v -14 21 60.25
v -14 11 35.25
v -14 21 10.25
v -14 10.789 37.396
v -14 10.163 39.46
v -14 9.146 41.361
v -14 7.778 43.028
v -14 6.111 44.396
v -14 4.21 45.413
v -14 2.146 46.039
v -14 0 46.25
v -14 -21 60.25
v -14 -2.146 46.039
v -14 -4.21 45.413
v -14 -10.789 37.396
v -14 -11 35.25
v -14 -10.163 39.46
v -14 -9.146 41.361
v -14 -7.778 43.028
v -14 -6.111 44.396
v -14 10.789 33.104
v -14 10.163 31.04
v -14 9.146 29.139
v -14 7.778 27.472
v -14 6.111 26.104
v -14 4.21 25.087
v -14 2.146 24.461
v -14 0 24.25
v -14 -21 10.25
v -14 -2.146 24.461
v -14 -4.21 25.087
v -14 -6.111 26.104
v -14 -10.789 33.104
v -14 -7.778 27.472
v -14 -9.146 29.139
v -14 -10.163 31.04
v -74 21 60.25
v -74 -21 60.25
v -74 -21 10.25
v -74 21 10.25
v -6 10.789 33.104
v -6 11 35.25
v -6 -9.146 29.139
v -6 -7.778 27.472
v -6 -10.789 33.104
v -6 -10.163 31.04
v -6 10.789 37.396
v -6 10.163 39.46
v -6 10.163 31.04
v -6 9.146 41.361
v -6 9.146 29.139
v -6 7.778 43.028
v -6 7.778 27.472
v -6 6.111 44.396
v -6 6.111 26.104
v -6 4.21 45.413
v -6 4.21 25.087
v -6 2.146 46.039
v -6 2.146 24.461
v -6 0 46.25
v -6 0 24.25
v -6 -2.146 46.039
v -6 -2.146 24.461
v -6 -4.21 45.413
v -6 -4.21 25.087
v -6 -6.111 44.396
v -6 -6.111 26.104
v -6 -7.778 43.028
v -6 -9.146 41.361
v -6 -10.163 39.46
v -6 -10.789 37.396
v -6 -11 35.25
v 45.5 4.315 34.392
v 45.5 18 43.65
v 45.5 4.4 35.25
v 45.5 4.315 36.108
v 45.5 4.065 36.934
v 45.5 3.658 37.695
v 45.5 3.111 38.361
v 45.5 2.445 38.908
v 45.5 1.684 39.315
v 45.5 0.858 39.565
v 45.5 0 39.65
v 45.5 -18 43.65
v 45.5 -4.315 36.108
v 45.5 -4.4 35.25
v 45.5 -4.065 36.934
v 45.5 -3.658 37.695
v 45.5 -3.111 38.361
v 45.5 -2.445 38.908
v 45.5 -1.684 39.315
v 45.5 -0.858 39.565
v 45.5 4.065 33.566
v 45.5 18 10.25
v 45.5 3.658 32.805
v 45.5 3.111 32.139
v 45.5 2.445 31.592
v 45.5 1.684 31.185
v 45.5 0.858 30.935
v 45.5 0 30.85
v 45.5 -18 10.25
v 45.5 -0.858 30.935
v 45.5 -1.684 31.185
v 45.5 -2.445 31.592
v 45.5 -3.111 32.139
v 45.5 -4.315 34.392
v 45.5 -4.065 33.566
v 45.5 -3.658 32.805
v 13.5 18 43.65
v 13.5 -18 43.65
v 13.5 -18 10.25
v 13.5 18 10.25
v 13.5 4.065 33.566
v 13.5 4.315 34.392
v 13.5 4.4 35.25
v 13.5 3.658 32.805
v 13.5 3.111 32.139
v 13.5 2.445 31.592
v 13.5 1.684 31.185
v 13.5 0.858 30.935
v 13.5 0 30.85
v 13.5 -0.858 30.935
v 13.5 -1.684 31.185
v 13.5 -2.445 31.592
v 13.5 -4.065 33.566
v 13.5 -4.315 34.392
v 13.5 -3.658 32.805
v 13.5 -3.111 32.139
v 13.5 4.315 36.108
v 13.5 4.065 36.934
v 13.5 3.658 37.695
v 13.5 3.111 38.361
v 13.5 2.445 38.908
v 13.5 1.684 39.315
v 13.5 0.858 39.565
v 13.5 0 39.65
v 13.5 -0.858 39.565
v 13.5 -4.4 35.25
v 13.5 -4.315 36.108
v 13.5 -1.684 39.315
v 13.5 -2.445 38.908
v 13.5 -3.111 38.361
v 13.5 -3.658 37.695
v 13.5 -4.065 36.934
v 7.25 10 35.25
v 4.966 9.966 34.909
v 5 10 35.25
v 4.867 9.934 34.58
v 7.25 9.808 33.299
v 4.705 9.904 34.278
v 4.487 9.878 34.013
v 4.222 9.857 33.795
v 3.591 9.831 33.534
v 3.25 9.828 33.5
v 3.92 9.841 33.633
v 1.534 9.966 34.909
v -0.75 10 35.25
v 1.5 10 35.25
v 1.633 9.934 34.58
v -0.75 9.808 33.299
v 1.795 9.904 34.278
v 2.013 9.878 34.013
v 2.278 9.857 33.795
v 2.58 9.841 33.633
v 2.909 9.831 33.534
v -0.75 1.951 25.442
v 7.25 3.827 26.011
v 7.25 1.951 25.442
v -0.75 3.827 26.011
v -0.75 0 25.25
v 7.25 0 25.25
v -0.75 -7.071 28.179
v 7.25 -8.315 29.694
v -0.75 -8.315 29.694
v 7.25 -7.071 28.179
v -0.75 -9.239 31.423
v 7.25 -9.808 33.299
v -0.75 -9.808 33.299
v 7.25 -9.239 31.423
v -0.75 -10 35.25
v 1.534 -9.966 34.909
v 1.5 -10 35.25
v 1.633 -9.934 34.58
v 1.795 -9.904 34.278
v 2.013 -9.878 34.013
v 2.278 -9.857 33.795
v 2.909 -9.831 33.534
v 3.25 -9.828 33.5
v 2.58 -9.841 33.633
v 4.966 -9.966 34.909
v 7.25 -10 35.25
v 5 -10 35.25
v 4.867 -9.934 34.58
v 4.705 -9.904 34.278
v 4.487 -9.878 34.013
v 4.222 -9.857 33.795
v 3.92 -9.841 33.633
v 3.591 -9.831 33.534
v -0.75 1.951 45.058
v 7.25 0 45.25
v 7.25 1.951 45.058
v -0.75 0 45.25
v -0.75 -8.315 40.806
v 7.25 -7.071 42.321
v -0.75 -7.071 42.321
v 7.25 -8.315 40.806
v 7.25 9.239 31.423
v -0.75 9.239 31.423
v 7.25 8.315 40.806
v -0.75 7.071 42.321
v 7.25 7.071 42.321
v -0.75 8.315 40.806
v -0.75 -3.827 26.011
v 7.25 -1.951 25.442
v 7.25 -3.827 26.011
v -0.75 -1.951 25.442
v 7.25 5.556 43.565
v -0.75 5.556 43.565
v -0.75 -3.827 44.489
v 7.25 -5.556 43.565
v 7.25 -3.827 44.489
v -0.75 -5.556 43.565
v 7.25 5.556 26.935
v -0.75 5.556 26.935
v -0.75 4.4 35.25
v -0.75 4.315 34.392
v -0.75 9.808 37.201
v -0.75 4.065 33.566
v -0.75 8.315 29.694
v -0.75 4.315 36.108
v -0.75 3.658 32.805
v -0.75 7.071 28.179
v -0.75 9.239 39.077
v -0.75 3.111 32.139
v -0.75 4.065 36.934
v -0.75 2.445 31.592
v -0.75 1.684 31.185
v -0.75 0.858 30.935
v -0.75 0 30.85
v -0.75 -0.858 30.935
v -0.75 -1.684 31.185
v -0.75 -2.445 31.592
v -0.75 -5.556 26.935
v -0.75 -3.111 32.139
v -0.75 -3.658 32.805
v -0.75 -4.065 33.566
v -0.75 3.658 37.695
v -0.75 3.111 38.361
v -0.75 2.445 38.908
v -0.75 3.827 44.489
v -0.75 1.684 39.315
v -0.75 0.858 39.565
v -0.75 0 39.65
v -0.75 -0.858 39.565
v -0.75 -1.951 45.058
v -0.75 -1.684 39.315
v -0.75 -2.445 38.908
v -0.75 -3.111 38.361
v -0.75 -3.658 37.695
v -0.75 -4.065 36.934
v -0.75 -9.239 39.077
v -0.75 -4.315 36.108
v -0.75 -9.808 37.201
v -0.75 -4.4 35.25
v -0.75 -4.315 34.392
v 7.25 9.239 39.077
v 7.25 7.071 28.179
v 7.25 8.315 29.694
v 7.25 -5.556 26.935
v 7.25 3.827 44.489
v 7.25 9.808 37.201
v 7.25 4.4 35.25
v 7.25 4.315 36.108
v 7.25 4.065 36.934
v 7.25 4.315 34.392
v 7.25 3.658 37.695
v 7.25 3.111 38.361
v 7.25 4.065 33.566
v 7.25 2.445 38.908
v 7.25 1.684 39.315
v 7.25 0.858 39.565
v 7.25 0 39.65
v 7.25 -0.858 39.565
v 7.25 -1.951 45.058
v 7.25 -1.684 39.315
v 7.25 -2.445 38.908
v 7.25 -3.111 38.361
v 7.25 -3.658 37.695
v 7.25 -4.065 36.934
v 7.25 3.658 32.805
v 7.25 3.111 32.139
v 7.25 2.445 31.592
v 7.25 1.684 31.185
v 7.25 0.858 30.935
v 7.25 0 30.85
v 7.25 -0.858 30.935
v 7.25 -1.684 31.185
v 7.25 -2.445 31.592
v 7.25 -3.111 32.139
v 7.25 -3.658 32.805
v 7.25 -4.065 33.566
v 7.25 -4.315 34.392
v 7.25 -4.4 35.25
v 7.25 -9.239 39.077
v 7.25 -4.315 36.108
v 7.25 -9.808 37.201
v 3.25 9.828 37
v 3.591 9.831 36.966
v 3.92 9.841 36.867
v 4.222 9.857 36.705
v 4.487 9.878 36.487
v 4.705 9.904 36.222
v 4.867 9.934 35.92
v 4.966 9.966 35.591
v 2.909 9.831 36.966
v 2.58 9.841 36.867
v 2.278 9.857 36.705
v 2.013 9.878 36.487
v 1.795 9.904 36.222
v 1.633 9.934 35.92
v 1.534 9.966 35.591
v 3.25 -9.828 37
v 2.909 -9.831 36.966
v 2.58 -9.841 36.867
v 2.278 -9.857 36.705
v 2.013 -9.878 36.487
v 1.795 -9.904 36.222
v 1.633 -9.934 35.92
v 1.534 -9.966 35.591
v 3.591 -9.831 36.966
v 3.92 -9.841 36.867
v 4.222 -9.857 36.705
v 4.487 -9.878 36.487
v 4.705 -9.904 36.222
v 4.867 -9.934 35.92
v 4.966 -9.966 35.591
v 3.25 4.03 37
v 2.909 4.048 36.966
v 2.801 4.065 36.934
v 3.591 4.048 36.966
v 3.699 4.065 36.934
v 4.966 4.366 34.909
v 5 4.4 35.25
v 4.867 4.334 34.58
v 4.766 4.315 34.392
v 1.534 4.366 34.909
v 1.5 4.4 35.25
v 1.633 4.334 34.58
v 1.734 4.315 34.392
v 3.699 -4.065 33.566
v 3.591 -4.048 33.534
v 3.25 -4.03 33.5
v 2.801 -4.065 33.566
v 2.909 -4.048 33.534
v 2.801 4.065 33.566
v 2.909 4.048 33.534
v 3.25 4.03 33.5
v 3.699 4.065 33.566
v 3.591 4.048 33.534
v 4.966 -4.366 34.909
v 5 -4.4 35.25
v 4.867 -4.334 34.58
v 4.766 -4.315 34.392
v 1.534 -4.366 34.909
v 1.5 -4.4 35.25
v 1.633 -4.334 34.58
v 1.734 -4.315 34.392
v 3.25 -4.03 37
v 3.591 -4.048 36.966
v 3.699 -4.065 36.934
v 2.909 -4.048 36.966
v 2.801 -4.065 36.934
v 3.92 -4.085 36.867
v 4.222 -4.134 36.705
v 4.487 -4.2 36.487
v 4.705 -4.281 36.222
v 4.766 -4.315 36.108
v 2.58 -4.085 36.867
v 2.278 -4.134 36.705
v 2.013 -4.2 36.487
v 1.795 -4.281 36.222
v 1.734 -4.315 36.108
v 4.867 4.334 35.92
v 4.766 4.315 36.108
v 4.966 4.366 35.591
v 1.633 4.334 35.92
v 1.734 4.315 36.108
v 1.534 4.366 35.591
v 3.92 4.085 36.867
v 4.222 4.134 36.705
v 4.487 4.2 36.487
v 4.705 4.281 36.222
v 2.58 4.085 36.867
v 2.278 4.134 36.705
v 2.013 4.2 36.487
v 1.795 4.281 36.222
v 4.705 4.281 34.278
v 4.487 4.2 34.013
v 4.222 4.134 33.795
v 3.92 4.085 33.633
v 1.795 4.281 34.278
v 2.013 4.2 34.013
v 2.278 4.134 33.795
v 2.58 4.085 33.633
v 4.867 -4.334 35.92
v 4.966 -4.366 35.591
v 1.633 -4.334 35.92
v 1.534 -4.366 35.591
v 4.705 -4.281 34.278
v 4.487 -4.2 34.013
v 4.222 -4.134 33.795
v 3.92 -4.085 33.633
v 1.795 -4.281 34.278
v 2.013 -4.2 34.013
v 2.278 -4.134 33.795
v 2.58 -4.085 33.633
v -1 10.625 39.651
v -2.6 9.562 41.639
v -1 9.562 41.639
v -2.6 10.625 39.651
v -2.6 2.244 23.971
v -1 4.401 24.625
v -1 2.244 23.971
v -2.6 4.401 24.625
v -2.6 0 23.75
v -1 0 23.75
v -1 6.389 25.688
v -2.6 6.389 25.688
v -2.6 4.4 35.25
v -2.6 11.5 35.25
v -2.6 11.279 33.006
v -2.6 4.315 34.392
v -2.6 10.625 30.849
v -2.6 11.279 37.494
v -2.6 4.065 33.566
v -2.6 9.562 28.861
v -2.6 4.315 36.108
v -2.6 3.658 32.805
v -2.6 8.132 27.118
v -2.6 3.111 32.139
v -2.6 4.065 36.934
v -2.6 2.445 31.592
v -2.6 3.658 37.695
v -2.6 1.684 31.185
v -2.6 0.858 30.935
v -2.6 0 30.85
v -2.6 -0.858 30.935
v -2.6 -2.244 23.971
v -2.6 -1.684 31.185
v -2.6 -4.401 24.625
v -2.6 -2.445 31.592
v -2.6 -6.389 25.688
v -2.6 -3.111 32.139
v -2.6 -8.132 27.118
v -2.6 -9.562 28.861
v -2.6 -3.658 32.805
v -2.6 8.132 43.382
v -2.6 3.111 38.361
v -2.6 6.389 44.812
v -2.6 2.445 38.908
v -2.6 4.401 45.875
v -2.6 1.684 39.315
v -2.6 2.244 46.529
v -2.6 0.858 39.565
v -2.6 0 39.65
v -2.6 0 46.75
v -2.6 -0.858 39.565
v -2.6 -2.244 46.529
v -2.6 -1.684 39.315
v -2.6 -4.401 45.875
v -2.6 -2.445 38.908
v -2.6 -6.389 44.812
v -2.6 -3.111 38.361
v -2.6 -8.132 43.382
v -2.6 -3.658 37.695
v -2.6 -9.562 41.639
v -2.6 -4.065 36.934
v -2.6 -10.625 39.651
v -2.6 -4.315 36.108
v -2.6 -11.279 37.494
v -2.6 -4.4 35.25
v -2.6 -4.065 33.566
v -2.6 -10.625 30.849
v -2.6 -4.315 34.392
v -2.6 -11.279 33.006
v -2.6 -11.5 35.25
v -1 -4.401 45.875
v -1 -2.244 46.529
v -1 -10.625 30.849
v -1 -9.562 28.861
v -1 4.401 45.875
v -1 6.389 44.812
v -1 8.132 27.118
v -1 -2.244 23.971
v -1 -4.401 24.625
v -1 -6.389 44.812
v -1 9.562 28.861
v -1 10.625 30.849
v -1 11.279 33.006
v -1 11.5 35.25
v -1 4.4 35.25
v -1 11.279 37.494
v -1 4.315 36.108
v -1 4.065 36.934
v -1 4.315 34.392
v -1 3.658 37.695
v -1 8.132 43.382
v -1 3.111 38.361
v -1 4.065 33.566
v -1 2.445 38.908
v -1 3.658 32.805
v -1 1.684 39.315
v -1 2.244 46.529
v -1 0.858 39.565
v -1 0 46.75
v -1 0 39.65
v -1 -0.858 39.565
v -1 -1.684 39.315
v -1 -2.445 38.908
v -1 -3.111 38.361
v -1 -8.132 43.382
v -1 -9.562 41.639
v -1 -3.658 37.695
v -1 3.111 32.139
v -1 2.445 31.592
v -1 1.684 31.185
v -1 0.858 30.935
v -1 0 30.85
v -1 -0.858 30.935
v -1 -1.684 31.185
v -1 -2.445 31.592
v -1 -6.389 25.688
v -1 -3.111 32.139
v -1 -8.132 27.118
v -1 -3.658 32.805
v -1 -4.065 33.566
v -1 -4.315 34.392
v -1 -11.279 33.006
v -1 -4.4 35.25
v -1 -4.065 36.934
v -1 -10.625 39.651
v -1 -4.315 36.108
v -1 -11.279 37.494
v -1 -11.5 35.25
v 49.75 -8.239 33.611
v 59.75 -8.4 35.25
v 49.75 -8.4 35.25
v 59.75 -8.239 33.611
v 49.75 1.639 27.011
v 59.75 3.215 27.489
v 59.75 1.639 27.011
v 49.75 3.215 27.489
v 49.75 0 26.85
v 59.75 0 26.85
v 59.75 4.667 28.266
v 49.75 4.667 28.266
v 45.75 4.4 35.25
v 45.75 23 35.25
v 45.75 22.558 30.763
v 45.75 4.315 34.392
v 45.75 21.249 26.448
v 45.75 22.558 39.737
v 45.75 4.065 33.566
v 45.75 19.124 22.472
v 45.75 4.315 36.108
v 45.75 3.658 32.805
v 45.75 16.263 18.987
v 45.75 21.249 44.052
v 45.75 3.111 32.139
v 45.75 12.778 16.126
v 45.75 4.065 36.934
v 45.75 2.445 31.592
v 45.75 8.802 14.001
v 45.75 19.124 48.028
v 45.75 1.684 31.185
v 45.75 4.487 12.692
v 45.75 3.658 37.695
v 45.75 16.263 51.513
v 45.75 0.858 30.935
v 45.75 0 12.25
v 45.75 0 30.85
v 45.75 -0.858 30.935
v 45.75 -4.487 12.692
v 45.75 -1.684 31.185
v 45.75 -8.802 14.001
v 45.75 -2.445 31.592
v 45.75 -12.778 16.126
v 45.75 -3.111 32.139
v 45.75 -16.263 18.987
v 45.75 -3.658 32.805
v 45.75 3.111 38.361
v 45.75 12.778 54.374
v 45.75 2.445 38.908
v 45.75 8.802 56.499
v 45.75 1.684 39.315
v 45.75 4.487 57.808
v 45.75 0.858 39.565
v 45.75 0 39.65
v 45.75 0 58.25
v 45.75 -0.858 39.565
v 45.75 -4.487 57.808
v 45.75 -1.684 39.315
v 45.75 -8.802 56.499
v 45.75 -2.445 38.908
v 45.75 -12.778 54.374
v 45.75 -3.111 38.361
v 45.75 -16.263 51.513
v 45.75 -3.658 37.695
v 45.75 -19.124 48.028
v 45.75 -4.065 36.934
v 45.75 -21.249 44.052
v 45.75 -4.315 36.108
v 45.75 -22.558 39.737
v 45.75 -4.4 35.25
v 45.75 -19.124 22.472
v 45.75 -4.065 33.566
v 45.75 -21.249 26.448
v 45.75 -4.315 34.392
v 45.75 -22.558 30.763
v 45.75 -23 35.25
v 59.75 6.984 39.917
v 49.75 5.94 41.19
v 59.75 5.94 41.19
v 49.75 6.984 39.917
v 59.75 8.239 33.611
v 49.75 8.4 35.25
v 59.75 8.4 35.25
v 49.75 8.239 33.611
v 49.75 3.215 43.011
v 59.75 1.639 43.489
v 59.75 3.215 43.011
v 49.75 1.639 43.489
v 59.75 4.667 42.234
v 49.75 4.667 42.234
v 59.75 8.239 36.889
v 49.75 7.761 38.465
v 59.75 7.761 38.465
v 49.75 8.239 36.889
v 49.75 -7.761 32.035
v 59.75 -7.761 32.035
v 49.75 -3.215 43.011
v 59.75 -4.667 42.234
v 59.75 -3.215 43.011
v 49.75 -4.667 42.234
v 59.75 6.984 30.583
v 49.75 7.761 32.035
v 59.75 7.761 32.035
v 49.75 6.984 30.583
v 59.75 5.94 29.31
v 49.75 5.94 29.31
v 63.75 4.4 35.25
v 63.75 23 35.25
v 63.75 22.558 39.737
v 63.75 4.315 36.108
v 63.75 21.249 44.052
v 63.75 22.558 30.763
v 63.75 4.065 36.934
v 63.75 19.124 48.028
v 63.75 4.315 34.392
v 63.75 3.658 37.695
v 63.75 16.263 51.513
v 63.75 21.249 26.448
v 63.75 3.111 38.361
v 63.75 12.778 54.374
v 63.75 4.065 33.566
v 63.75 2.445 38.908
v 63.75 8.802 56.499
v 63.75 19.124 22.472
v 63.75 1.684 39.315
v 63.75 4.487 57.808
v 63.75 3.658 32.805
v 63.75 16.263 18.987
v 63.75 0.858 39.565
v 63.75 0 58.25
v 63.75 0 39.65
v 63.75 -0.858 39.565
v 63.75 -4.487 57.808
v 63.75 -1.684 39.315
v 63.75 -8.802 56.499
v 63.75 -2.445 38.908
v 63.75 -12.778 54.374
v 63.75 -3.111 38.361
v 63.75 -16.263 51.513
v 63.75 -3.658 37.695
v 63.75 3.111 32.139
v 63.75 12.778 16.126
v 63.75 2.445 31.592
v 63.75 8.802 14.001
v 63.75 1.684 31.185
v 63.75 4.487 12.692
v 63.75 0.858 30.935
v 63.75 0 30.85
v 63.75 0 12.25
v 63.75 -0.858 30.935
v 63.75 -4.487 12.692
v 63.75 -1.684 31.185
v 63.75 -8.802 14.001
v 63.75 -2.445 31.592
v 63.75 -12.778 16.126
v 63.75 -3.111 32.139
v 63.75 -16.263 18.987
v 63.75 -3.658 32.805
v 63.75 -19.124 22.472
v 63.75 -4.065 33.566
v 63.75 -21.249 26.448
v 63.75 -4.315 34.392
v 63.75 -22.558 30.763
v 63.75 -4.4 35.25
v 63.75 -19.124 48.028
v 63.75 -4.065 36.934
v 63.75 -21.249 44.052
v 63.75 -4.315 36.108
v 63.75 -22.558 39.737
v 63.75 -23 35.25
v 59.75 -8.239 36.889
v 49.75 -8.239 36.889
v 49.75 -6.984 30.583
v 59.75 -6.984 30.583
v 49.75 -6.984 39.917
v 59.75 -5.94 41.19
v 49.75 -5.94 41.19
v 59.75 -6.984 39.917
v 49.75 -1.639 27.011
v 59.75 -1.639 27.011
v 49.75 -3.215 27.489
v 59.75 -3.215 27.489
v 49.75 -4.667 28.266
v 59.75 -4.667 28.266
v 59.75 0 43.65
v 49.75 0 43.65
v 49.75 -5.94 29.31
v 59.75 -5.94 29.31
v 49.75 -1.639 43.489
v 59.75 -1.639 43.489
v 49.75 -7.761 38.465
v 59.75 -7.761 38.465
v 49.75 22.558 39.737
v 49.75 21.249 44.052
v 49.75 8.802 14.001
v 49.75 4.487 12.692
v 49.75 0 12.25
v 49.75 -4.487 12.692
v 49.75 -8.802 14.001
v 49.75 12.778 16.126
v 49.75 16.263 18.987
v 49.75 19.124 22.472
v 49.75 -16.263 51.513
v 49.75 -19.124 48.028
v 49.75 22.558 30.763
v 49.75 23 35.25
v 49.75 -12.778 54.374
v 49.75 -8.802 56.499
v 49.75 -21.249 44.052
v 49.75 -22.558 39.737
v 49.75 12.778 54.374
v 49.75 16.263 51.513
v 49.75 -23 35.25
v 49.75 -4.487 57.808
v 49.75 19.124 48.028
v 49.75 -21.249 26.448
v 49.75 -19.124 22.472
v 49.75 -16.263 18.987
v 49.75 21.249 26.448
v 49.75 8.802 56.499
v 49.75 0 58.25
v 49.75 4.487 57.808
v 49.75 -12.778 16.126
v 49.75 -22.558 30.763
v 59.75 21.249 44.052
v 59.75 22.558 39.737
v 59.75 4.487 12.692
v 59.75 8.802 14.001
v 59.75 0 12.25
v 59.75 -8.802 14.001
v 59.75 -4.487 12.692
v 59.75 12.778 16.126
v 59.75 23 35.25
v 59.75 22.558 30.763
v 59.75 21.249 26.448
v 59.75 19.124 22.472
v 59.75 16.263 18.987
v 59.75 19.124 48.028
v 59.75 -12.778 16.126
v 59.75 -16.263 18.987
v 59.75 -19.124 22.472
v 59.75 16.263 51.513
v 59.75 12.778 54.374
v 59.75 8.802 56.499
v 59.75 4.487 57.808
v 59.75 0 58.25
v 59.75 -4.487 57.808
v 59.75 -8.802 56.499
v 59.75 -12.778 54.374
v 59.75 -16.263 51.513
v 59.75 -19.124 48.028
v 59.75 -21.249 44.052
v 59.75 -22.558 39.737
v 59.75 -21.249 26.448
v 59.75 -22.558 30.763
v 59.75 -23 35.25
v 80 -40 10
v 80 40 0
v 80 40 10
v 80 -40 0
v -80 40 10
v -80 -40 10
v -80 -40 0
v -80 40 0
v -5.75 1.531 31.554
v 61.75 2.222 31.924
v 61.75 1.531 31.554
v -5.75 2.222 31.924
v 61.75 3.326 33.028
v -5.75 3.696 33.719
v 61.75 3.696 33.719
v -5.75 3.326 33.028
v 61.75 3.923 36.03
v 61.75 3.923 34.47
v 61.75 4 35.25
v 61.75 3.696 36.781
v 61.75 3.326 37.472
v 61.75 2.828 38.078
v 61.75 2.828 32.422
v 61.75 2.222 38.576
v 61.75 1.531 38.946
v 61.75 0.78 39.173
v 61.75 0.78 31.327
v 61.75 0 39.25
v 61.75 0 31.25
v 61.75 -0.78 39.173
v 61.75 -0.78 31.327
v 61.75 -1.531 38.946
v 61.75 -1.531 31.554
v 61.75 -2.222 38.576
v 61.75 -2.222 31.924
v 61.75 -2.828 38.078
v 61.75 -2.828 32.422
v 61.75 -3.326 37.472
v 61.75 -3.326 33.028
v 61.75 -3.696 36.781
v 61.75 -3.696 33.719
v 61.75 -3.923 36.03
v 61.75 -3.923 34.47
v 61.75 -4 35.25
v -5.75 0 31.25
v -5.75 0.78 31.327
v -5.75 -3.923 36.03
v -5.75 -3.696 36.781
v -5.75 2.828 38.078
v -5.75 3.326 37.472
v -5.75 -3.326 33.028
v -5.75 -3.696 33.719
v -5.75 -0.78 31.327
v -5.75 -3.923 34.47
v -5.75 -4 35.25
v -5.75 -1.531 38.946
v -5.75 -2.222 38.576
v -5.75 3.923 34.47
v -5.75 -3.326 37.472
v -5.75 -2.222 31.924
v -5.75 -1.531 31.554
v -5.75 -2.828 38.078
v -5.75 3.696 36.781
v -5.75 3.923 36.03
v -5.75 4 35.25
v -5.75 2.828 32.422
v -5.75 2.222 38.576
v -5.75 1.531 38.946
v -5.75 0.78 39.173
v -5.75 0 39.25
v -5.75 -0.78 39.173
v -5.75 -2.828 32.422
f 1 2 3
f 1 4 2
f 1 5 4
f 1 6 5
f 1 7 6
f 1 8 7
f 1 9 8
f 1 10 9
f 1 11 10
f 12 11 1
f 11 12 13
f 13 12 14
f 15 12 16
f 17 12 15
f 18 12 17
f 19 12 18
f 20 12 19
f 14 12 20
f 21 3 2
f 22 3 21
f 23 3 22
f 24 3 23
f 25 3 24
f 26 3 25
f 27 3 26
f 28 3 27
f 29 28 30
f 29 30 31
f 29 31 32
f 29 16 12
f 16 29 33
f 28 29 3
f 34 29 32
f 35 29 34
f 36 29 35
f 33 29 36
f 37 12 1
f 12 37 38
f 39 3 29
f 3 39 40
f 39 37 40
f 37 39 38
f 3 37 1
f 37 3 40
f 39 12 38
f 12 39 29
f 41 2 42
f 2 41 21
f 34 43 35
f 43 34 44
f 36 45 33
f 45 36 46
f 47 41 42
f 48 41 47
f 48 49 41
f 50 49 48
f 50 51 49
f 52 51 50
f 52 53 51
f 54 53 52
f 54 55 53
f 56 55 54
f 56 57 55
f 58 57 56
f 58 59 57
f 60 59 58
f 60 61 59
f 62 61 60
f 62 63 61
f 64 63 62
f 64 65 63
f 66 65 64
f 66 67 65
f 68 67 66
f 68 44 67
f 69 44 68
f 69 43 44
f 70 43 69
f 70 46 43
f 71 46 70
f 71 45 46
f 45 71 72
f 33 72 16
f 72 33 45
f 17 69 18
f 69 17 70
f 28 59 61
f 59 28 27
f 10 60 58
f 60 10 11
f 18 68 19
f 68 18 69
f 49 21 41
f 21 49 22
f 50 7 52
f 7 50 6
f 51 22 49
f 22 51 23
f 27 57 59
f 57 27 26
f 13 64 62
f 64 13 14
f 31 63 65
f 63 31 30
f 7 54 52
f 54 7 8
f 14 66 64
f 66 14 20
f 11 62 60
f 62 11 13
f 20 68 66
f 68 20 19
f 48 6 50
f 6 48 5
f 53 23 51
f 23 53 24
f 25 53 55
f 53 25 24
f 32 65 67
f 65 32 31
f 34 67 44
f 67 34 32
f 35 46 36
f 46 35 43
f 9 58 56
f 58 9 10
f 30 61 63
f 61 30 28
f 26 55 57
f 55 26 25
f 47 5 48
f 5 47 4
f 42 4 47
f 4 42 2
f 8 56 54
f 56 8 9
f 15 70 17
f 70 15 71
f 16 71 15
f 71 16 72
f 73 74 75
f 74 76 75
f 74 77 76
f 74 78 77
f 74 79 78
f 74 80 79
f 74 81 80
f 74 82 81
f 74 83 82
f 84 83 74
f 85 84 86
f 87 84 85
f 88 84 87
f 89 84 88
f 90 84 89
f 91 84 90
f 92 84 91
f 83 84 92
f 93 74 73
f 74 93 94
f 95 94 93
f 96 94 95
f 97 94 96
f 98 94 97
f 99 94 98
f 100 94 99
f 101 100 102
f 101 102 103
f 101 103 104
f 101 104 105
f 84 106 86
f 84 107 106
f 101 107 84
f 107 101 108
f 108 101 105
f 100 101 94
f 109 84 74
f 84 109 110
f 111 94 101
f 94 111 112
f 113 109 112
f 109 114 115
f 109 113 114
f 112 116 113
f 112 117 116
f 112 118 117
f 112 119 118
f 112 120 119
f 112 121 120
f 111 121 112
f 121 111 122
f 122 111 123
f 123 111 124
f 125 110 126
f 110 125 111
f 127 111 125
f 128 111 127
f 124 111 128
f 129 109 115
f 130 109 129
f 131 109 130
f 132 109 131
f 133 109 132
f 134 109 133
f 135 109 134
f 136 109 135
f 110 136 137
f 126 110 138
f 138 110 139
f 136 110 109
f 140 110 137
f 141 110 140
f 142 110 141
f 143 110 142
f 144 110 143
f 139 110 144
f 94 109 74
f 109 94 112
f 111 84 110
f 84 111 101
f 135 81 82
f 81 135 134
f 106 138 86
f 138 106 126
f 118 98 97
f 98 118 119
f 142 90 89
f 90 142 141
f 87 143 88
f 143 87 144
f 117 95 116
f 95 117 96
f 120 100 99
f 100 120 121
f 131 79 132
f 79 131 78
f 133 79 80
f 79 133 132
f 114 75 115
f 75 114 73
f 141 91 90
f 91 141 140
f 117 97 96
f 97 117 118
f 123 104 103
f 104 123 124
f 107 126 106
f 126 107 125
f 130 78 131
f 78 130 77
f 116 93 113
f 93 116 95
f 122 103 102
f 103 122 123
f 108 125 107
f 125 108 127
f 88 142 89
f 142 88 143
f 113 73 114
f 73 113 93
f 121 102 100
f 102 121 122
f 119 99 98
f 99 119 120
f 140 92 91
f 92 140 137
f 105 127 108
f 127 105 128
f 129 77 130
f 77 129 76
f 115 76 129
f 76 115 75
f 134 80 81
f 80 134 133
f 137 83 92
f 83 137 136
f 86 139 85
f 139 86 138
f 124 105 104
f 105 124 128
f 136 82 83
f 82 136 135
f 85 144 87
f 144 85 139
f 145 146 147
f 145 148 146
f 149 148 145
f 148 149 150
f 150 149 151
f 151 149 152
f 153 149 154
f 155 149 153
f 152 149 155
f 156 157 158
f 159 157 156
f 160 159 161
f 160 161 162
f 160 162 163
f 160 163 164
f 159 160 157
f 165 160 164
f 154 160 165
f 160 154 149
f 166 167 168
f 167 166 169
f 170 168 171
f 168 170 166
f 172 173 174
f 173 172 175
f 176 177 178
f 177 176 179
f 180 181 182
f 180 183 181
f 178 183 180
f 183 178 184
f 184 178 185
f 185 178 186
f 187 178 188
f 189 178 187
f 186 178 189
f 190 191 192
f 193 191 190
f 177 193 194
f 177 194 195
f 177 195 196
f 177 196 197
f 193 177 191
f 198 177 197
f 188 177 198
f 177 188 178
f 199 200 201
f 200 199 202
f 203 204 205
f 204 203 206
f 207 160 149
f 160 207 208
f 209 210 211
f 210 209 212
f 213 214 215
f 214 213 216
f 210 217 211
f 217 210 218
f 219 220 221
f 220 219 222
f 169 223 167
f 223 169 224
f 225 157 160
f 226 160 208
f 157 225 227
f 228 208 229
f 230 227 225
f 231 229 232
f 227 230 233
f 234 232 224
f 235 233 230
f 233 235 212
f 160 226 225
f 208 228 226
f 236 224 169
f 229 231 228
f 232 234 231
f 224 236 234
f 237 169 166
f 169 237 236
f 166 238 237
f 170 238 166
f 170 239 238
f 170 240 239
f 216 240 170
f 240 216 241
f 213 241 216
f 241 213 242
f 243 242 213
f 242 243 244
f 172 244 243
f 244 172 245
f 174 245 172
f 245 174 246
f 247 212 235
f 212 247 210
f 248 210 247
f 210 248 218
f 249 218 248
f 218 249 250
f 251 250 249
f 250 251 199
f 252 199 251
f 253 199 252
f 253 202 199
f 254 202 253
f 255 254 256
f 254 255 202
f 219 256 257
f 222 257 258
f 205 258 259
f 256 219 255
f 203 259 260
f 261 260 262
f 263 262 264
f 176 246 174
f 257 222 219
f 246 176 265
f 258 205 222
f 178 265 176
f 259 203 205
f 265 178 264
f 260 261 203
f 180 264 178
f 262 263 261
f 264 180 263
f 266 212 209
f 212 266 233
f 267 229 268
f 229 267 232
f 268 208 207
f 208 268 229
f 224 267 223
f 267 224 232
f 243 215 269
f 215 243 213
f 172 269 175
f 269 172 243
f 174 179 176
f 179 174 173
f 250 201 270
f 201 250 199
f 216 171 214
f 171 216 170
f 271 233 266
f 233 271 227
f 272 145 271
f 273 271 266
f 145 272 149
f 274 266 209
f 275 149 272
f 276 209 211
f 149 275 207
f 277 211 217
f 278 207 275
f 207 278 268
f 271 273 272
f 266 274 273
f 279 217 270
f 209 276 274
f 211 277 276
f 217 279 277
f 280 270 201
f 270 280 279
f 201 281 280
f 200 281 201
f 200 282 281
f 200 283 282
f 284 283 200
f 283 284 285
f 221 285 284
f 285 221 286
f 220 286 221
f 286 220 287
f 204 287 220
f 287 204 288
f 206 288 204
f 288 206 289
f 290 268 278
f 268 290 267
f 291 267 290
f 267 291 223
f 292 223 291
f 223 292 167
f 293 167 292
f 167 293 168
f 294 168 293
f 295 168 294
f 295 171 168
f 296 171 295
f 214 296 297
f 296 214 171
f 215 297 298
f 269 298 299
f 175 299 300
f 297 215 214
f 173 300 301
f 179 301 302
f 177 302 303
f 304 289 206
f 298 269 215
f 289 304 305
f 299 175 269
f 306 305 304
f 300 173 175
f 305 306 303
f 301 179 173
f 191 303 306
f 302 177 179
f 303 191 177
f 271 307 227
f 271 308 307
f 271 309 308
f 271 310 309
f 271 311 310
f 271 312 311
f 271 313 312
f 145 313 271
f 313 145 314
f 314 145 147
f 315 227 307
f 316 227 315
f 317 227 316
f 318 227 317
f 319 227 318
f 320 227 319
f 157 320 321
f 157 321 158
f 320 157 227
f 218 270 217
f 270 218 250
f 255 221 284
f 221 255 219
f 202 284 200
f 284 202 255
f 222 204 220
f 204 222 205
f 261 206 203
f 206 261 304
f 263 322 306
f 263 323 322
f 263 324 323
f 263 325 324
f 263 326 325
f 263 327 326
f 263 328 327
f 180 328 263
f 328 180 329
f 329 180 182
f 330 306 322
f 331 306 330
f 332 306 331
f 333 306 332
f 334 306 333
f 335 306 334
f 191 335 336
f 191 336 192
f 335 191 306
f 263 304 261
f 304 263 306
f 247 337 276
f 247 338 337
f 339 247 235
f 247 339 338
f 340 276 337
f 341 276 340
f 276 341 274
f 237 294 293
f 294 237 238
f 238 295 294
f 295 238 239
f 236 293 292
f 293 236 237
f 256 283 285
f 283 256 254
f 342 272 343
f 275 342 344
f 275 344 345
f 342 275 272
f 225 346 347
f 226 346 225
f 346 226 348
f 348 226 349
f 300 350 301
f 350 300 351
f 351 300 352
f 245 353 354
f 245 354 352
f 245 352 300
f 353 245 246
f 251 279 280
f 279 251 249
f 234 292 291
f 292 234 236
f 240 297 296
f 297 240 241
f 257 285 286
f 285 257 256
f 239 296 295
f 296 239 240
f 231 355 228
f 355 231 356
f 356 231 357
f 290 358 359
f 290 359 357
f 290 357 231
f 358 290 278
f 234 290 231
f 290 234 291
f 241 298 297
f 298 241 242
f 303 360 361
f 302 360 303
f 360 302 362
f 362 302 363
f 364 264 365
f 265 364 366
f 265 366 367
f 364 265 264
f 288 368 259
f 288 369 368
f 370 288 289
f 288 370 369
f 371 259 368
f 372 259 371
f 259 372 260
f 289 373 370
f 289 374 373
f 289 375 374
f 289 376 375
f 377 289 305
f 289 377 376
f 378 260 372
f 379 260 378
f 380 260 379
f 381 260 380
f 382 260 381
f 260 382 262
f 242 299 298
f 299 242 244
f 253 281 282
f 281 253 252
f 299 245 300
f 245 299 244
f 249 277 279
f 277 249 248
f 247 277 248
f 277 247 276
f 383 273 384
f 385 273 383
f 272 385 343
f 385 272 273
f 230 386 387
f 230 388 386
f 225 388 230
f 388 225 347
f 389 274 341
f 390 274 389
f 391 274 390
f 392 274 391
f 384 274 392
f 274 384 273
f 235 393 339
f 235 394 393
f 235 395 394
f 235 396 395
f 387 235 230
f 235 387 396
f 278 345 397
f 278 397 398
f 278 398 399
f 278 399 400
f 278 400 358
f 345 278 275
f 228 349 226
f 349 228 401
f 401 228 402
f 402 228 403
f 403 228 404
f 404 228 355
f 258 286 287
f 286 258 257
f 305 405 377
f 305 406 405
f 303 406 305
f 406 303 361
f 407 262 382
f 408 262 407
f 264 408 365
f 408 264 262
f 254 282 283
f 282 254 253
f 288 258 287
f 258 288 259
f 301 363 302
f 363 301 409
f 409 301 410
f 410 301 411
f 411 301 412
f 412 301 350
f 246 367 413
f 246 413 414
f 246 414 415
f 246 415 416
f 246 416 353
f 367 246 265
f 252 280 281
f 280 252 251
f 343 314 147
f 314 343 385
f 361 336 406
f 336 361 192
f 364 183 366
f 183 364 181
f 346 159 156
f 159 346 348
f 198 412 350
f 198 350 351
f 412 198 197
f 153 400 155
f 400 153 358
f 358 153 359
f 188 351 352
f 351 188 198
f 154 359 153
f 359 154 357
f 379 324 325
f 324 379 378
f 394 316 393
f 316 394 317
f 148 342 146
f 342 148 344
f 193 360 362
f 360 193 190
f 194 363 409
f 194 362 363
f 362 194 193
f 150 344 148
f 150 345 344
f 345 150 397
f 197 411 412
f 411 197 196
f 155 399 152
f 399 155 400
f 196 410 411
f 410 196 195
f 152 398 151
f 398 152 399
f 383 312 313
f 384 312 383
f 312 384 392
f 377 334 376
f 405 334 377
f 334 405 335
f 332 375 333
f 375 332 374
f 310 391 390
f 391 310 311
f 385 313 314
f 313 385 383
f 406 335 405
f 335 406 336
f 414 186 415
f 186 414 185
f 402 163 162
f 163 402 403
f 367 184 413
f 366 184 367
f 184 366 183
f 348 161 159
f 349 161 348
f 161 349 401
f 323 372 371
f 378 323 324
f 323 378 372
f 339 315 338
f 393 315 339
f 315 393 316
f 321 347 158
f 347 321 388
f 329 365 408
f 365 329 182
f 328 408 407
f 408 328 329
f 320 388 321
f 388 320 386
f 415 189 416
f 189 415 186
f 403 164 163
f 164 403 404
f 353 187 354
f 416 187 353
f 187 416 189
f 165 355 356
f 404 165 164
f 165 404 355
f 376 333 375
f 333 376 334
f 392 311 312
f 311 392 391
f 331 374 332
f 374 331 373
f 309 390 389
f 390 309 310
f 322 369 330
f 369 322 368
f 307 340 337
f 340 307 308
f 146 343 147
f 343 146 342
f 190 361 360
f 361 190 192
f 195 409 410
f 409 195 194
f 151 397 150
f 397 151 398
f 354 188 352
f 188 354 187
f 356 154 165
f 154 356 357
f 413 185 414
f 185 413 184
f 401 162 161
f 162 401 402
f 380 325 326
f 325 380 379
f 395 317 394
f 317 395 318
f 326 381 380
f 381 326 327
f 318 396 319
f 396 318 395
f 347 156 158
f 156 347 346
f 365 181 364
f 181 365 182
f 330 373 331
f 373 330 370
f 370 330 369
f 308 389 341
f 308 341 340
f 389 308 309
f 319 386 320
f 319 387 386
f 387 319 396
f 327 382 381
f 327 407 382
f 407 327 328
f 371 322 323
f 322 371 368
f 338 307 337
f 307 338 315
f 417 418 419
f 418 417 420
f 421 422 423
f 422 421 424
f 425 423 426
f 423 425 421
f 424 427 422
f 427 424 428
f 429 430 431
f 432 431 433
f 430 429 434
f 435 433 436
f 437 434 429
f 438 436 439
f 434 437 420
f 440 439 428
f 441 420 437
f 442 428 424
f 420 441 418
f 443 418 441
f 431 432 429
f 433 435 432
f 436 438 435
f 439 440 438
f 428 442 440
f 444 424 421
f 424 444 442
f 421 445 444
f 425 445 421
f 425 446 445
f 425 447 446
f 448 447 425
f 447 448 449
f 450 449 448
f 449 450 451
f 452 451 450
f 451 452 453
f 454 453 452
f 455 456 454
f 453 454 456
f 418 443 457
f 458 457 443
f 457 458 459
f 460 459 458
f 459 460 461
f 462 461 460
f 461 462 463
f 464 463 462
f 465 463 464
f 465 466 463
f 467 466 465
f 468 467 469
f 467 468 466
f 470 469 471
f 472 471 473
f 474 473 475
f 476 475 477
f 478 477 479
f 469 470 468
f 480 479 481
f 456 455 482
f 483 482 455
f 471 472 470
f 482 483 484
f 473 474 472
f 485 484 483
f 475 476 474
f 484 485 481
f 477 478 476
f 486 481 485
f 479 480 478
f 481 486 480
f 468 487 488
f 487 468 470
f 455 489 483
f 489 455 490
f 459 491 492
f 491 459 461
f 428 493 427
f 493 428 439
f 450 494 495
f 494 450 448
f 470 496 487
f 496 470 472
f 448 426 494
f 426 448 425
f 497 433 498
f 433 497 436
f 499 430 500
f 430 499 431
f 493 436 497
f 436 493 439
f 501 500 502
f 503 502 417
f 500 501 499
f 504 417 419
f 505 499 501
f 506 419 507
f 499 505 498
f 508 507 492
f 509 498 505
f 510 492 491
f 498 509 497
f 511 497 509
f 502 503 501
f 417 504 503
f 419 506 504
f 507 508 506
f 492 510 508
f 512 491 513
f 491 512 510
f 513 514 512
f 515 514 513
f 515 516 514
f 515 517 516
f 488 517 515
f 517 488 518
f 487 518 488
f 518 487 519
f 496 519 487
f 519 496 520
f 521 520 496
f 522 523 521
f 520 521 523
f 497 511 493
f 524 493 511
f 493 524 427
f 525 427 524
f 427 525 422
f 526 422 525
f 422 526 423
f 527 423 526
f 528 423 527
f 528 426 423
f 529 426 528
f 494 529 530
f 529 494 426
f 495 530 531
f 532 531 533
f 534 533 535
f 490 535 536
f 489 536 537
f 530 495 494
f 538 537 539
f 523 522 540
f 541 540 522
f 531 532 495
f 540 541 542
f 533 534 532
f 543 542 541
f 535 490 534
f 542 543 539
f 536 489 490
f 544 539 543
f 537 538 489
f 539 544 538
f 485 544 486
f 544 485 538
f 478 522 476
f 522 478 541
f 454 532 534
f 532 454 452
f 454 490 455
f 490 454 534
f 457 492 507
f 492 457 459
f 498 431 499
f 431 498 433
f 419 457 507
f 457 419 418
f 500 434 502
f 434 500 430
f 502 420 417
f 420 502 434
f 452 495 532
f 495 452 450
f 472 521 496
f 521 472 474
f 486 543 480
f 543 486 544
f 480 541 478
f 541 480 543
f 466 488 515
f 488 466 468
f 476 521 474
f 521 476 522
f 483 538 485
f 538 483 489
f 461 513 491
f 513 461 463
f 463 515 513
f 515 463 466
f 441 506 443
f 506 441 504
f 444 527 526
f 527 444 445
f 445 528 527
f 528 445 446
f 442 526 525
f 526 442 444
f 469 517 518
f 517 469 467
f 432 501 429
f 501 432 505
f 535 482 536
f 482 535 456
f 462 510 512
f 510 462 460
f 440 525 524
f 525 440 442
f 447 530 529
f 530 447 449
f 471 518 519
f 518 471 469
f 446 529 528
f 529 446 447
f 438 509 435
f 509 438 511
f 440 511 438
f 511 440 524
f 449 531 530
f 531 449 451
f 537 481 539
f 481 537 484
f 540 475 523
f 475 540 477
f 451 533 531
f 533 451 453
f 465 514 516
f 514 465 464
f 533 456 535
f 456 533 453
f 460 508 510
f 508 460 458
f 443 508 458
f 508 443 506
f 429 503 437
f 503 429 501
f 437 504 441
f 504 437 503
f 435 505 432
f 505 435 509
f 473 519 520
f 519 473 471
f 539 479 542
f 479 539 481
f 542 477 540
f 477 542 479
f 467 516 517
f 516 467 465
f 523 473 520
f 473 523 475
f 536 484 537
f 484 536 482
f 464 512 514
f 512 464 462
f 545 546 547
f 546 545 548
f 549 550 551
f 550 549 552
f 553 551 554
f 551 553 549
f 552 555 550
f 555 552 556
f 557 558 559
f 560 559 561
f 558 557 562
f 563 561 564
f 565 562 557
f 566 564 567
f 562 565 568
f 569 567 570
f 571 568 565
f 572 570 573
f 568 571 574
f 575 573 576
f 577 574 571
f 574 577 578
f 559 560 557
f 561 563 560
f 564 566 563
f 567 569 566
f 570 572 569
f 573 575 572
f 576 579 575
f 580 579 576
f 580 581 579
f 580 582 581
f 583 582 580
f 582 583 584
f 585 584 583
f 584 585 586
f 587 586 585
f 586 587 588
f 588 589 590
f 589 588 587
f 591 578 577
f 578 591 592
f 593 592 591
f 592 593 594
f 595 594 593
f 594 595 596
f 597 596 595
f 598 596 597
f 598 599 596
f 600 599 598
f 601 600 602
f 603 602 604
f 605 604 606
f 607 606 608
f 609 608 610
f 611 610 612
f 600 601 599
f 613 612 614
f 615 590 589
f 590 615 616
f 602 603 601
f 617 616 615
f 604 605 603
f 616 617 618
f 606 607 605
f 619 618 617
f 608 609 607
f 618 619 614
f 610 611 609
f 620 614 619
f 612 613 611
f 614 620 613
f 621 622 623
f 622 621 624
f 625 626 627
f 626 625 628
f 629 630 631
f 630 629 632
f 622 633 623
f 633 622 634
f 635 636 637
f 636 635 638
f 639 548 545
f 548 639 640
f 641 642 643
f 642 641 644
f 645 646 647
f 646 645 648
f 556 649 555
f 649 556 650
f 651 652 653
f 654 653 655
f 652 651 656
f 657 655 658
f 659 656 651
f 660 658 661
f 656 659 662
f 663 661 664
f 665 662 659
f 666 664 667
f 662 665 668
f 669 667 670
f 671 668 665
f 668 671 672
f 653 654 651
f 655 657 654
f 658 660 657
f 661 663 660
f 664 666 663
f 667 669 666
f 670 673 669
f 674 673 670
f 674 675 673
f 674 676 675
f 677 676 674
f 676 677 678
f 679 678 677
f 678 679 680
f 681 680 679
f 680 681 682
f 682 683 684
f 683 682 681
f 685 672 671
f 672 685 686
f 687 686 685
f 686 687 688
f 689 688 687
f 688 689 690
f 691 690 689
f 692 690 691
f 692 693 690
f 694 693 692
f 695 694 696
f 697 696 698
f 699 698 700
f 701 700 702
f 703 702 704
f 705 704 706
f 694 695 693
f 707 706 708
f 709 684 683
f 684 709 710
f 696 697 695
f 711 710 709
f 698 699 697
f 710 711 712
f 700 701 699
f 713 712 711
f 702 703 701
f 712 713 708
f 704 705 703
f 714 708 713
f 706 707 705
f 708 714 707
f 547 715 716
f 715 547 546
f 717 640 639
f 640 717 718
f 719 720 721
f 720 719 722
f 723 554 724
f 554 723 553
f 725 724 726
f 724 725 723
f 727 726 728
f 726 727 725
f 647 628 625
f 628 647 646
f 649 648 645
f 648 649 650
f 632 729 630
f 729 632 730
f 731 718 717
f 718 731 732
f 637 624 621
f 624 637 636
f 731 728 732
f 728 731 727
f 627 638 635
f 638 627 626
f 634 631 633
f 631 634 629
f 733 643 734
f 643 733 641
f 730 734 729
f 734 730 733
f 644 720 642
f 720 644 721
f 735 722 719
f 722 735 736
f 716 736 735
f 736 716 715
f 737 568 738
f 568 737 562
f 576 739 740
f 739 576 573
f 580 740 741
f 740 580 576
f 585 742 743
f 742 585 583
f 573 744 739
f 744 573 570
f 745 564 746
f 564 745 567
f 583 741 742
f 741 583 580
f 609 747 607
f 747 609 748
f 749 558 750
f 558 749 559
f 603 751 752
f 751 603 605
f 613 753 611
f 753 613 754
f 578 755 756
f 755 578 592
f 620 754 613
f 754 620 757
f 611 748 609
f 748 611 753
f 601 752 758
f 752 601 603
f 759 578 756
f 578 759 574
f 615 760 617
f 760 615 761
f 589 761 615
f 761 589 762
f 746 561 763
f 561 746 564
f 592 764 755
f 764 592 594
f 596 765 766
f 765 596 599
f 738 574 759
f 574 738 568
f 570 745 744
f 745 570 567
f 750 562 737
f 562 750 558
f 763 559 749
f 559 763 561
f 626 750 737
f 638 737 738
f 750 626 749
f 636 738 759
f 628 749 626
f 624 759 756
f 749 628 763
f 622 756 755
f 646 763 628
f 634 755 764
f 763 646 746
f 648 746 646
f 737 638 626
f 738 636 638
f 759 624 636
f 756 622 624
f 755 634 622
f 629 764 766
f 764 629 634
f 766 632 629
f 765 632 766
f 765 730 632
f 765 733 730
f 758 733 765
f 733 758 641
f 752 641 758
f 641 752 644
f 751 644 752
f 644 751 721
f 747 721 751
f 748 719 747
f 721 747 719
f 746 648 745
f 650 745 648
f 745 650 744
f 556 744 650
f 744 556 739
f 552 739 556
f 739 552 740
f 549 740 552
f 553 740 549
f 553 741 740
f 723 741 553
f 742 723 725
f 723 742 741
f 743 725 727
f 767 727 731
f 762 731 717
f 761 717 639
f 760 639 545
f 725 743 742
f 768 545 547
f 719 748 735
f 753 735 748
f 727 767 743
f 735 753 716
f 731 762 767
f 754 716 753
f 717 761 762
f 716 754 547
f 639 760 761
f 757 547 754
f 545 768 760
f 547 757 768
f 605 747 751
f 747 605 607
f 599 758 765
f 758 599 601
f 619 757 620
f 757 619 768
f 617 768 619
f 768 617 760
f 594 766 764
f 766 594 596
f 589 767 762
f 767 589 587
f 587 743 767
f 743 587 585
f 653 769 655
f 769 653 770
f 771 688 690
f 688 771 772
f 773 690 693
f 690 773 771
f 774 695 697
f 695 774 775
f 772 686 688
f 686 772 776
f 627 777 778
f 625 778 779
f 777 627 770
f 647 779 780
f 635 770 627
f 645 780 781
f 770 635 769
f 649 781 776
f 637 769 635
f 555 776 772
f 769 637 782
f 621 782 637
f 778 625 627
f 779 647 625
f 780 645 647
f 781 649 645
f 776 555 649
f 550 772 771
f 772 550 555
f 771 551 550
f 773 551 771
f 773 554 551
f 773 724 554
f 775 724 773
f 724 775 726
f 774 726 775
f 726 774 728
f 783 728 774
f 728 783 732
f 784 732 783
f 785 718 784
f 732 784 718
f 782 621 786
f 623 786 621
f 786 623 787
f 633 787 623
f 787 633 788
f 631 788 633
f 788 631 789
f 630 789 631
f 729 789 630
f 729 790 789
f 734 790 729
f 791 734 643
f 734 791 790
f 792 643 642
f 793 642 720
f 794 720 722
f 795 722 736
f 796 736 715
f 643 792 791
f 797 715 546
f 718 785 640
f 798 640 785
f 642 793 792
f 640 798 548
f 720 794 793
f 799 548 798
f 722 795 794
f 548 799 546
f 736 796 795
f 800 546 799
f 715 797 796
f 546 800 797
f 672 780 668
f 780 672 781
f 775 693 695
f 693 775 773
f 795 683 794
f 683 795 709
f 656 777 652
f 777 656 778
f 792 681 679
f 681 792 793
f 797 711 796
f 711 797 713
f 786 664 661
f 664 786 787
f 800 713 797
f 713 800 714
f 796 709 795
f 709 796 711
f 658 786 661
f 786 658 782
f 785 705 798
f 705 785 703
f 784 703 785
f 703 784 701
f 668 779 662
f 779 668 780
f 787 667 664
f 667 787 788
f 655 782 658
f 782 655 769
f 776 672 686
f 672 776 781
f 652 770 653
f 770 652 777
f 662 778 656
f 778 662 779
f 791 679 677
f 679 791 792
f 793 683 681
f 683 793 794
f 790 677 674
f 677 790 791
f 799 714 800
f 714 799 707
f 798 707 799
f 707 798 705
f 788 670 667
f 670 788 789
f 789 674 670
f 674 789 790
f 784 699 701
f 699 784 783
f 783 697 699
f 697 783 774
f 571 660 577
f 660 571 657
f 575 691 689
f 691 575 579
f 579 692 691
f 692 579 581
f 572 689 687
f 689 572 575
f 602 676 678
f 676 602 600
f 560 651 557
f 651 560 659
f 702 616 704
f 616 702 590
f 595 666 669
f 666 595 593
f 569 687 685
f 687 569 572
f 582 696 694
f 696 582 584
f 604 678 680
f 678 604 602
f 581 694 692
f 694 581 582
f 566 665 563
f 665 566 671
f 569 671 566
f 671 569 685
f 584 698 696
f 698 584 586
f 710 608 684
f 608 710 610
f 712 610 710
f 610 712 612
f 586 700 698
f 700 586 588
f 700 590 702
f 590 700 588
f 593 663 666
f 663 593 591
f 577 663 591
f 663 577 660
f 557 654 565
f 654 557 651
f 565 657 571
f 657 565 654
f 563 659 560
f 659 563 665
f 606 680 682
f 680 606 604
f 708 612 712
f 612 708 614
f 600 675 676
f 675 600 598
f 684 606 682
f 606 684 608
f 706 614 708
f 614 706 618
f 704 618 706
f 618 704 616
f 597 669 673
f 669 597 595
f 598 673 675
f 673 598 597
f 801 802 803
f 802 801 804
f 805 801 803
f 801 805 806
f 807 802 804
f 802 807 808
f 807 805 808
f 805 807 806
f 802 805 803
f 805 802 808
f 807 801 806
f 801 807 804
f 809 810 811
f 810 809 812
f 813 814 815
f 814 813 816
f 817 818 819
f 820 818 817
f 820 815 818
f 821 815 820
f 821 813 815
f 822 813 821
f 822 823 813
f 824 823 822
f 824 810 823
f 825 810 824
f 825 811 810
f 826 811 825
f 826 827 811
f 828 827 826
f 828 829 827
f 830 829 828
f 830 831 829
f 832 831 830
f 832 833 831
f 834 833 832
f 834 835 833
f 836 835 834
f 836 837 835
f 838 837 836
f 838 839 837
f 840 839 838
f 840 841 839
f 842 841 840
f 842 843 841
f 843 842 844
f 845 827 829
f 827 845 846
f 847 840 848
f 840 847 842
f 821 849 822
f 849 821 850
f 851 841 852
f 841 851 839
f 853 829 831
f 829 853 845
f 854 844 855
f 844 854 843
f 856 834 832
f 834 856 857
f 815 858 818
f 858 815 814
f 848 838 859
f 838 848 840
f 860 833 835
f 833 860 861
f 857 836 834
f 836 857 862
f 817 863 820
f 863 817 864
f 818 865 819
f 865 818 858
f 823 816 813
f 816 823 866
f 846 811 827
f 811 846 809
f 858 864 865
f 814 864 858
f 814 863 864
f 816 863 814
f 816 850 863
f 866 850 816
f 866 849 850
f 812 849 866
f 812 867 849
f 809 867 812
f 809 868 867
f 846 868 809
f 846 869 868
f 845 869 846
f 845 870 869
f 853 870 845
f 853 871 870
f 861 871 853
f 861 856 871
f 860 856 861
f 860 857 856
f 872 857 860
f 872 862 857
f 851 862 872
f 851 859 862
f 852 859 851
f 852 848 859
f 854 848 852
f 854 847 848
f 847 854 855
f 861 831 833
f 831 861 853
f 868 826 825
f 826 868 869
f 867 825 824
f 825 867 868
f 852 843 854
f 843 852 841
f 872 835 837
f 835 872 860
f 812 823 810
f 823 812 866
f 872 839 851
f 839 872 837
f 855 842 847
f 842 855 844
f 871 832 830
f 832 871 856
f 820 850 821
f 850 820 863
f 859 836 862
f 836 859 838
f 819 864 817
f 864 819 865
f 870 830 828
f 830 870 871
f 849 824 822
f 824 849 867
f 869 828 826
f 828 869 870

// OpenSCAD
$fn = 32;

// ------------------------------------------------------------------------
// Motor drive station: motor 60 x 50 mm, shaft d8, pulley d46
// Every part is its own module, assembly() places every instance.
// ------------------------------------------------------------------------

// --- part 1 ---
module station_bed() {
  difference() {
    translate([-80, -40, 0]) cube([160, 80, 10]);
  }
}

// --- part 2 ---
module drive_motor() {
  union() {
    translate([-30, -21, 0]) cube([60, 42, 50]);
    translate([34, 0, 25]) rotate([0, 90, 0]) cylinder(h = 8, d = 22, center = true);
  }
}

// --- part 3 ---
module pillow_block() {
  difference() {
    translate([-16, -18, 0]) cube([32, 36, 33.4]);
    translate([0, 0, 25]) rotate([0, 90, 0]) cylinder(h = 34, d = 8.8, center = true);
  }
}

// --- part 4 ---
module drive_shaft() {
  translate([0, 0, -33.75]) cylinder(h = 67.5, d = 8);
}

// --- part 5 ---
module shaft_collar() {
  difference() {
    cylinder(h = 8, d = 20);
    translate([0, 0, -1]) cylinder(h = 10, d = 8.8);
    translate([0, 0, 4]) rotate([90, 0, 0]) cylinder(h = 22, d = 3.5, center = true);
  }
}

// --- part 6 ---
module collar_washer() {
  difference() {
      translate([0, 0, 0]) cylinder(h = 1.6, d = 23);
      translate([0, 0, -1]) cylinder(h = 3.6, d = 8.8);
    }
}

// --- part 7 ---
module drive_pulley() {
  difference() {
    union() {
      cylinder(h = 18, d = 16.8);
      cylinder(h = 4, d = 46);
      translate([0, 0, 14]) cylinder(h = 4, d = 46);
    }
    translate([0, 0, -1]) cylinder(h = 20, d = 8.8);
  }
}

// --- assembly ---
module assembly() {
  color([0.80, 0.24, 0.20]) translate([0, 0, 0]) rotate([0, 0, 0]) station_bed();
  color([0.20, 0.45, 0.75]) translate([-44, 0, 10.25]) rotate([0, 0, 0]) drive_motor();
  color([0.25, 0.62, 0.32]) translate([29.5, 0, 10.25]) rotate([0, 0, 0]) pillow_block();
  color([0.92, 0.70, 0.18]) translate([28, 0, 35.25]) rotate([0, 90, 0]) drive_shaft();
  color([0.58, 0.35, 0.70]) translate([-0.75, 0, 35.25]) rotate([0, 90, 0]) shaft_collar();
  color([0.16, 0.66, 0.66]) translate([-2.6, 0, 35.25]) rotate([0, 90, 0]) collar_washer();
  color([0.85, 0.48, 0.18]) translate([45.75, 0, 35.25]) rotate([0, 90, 0]) drive_pulley();
}

assembly();
